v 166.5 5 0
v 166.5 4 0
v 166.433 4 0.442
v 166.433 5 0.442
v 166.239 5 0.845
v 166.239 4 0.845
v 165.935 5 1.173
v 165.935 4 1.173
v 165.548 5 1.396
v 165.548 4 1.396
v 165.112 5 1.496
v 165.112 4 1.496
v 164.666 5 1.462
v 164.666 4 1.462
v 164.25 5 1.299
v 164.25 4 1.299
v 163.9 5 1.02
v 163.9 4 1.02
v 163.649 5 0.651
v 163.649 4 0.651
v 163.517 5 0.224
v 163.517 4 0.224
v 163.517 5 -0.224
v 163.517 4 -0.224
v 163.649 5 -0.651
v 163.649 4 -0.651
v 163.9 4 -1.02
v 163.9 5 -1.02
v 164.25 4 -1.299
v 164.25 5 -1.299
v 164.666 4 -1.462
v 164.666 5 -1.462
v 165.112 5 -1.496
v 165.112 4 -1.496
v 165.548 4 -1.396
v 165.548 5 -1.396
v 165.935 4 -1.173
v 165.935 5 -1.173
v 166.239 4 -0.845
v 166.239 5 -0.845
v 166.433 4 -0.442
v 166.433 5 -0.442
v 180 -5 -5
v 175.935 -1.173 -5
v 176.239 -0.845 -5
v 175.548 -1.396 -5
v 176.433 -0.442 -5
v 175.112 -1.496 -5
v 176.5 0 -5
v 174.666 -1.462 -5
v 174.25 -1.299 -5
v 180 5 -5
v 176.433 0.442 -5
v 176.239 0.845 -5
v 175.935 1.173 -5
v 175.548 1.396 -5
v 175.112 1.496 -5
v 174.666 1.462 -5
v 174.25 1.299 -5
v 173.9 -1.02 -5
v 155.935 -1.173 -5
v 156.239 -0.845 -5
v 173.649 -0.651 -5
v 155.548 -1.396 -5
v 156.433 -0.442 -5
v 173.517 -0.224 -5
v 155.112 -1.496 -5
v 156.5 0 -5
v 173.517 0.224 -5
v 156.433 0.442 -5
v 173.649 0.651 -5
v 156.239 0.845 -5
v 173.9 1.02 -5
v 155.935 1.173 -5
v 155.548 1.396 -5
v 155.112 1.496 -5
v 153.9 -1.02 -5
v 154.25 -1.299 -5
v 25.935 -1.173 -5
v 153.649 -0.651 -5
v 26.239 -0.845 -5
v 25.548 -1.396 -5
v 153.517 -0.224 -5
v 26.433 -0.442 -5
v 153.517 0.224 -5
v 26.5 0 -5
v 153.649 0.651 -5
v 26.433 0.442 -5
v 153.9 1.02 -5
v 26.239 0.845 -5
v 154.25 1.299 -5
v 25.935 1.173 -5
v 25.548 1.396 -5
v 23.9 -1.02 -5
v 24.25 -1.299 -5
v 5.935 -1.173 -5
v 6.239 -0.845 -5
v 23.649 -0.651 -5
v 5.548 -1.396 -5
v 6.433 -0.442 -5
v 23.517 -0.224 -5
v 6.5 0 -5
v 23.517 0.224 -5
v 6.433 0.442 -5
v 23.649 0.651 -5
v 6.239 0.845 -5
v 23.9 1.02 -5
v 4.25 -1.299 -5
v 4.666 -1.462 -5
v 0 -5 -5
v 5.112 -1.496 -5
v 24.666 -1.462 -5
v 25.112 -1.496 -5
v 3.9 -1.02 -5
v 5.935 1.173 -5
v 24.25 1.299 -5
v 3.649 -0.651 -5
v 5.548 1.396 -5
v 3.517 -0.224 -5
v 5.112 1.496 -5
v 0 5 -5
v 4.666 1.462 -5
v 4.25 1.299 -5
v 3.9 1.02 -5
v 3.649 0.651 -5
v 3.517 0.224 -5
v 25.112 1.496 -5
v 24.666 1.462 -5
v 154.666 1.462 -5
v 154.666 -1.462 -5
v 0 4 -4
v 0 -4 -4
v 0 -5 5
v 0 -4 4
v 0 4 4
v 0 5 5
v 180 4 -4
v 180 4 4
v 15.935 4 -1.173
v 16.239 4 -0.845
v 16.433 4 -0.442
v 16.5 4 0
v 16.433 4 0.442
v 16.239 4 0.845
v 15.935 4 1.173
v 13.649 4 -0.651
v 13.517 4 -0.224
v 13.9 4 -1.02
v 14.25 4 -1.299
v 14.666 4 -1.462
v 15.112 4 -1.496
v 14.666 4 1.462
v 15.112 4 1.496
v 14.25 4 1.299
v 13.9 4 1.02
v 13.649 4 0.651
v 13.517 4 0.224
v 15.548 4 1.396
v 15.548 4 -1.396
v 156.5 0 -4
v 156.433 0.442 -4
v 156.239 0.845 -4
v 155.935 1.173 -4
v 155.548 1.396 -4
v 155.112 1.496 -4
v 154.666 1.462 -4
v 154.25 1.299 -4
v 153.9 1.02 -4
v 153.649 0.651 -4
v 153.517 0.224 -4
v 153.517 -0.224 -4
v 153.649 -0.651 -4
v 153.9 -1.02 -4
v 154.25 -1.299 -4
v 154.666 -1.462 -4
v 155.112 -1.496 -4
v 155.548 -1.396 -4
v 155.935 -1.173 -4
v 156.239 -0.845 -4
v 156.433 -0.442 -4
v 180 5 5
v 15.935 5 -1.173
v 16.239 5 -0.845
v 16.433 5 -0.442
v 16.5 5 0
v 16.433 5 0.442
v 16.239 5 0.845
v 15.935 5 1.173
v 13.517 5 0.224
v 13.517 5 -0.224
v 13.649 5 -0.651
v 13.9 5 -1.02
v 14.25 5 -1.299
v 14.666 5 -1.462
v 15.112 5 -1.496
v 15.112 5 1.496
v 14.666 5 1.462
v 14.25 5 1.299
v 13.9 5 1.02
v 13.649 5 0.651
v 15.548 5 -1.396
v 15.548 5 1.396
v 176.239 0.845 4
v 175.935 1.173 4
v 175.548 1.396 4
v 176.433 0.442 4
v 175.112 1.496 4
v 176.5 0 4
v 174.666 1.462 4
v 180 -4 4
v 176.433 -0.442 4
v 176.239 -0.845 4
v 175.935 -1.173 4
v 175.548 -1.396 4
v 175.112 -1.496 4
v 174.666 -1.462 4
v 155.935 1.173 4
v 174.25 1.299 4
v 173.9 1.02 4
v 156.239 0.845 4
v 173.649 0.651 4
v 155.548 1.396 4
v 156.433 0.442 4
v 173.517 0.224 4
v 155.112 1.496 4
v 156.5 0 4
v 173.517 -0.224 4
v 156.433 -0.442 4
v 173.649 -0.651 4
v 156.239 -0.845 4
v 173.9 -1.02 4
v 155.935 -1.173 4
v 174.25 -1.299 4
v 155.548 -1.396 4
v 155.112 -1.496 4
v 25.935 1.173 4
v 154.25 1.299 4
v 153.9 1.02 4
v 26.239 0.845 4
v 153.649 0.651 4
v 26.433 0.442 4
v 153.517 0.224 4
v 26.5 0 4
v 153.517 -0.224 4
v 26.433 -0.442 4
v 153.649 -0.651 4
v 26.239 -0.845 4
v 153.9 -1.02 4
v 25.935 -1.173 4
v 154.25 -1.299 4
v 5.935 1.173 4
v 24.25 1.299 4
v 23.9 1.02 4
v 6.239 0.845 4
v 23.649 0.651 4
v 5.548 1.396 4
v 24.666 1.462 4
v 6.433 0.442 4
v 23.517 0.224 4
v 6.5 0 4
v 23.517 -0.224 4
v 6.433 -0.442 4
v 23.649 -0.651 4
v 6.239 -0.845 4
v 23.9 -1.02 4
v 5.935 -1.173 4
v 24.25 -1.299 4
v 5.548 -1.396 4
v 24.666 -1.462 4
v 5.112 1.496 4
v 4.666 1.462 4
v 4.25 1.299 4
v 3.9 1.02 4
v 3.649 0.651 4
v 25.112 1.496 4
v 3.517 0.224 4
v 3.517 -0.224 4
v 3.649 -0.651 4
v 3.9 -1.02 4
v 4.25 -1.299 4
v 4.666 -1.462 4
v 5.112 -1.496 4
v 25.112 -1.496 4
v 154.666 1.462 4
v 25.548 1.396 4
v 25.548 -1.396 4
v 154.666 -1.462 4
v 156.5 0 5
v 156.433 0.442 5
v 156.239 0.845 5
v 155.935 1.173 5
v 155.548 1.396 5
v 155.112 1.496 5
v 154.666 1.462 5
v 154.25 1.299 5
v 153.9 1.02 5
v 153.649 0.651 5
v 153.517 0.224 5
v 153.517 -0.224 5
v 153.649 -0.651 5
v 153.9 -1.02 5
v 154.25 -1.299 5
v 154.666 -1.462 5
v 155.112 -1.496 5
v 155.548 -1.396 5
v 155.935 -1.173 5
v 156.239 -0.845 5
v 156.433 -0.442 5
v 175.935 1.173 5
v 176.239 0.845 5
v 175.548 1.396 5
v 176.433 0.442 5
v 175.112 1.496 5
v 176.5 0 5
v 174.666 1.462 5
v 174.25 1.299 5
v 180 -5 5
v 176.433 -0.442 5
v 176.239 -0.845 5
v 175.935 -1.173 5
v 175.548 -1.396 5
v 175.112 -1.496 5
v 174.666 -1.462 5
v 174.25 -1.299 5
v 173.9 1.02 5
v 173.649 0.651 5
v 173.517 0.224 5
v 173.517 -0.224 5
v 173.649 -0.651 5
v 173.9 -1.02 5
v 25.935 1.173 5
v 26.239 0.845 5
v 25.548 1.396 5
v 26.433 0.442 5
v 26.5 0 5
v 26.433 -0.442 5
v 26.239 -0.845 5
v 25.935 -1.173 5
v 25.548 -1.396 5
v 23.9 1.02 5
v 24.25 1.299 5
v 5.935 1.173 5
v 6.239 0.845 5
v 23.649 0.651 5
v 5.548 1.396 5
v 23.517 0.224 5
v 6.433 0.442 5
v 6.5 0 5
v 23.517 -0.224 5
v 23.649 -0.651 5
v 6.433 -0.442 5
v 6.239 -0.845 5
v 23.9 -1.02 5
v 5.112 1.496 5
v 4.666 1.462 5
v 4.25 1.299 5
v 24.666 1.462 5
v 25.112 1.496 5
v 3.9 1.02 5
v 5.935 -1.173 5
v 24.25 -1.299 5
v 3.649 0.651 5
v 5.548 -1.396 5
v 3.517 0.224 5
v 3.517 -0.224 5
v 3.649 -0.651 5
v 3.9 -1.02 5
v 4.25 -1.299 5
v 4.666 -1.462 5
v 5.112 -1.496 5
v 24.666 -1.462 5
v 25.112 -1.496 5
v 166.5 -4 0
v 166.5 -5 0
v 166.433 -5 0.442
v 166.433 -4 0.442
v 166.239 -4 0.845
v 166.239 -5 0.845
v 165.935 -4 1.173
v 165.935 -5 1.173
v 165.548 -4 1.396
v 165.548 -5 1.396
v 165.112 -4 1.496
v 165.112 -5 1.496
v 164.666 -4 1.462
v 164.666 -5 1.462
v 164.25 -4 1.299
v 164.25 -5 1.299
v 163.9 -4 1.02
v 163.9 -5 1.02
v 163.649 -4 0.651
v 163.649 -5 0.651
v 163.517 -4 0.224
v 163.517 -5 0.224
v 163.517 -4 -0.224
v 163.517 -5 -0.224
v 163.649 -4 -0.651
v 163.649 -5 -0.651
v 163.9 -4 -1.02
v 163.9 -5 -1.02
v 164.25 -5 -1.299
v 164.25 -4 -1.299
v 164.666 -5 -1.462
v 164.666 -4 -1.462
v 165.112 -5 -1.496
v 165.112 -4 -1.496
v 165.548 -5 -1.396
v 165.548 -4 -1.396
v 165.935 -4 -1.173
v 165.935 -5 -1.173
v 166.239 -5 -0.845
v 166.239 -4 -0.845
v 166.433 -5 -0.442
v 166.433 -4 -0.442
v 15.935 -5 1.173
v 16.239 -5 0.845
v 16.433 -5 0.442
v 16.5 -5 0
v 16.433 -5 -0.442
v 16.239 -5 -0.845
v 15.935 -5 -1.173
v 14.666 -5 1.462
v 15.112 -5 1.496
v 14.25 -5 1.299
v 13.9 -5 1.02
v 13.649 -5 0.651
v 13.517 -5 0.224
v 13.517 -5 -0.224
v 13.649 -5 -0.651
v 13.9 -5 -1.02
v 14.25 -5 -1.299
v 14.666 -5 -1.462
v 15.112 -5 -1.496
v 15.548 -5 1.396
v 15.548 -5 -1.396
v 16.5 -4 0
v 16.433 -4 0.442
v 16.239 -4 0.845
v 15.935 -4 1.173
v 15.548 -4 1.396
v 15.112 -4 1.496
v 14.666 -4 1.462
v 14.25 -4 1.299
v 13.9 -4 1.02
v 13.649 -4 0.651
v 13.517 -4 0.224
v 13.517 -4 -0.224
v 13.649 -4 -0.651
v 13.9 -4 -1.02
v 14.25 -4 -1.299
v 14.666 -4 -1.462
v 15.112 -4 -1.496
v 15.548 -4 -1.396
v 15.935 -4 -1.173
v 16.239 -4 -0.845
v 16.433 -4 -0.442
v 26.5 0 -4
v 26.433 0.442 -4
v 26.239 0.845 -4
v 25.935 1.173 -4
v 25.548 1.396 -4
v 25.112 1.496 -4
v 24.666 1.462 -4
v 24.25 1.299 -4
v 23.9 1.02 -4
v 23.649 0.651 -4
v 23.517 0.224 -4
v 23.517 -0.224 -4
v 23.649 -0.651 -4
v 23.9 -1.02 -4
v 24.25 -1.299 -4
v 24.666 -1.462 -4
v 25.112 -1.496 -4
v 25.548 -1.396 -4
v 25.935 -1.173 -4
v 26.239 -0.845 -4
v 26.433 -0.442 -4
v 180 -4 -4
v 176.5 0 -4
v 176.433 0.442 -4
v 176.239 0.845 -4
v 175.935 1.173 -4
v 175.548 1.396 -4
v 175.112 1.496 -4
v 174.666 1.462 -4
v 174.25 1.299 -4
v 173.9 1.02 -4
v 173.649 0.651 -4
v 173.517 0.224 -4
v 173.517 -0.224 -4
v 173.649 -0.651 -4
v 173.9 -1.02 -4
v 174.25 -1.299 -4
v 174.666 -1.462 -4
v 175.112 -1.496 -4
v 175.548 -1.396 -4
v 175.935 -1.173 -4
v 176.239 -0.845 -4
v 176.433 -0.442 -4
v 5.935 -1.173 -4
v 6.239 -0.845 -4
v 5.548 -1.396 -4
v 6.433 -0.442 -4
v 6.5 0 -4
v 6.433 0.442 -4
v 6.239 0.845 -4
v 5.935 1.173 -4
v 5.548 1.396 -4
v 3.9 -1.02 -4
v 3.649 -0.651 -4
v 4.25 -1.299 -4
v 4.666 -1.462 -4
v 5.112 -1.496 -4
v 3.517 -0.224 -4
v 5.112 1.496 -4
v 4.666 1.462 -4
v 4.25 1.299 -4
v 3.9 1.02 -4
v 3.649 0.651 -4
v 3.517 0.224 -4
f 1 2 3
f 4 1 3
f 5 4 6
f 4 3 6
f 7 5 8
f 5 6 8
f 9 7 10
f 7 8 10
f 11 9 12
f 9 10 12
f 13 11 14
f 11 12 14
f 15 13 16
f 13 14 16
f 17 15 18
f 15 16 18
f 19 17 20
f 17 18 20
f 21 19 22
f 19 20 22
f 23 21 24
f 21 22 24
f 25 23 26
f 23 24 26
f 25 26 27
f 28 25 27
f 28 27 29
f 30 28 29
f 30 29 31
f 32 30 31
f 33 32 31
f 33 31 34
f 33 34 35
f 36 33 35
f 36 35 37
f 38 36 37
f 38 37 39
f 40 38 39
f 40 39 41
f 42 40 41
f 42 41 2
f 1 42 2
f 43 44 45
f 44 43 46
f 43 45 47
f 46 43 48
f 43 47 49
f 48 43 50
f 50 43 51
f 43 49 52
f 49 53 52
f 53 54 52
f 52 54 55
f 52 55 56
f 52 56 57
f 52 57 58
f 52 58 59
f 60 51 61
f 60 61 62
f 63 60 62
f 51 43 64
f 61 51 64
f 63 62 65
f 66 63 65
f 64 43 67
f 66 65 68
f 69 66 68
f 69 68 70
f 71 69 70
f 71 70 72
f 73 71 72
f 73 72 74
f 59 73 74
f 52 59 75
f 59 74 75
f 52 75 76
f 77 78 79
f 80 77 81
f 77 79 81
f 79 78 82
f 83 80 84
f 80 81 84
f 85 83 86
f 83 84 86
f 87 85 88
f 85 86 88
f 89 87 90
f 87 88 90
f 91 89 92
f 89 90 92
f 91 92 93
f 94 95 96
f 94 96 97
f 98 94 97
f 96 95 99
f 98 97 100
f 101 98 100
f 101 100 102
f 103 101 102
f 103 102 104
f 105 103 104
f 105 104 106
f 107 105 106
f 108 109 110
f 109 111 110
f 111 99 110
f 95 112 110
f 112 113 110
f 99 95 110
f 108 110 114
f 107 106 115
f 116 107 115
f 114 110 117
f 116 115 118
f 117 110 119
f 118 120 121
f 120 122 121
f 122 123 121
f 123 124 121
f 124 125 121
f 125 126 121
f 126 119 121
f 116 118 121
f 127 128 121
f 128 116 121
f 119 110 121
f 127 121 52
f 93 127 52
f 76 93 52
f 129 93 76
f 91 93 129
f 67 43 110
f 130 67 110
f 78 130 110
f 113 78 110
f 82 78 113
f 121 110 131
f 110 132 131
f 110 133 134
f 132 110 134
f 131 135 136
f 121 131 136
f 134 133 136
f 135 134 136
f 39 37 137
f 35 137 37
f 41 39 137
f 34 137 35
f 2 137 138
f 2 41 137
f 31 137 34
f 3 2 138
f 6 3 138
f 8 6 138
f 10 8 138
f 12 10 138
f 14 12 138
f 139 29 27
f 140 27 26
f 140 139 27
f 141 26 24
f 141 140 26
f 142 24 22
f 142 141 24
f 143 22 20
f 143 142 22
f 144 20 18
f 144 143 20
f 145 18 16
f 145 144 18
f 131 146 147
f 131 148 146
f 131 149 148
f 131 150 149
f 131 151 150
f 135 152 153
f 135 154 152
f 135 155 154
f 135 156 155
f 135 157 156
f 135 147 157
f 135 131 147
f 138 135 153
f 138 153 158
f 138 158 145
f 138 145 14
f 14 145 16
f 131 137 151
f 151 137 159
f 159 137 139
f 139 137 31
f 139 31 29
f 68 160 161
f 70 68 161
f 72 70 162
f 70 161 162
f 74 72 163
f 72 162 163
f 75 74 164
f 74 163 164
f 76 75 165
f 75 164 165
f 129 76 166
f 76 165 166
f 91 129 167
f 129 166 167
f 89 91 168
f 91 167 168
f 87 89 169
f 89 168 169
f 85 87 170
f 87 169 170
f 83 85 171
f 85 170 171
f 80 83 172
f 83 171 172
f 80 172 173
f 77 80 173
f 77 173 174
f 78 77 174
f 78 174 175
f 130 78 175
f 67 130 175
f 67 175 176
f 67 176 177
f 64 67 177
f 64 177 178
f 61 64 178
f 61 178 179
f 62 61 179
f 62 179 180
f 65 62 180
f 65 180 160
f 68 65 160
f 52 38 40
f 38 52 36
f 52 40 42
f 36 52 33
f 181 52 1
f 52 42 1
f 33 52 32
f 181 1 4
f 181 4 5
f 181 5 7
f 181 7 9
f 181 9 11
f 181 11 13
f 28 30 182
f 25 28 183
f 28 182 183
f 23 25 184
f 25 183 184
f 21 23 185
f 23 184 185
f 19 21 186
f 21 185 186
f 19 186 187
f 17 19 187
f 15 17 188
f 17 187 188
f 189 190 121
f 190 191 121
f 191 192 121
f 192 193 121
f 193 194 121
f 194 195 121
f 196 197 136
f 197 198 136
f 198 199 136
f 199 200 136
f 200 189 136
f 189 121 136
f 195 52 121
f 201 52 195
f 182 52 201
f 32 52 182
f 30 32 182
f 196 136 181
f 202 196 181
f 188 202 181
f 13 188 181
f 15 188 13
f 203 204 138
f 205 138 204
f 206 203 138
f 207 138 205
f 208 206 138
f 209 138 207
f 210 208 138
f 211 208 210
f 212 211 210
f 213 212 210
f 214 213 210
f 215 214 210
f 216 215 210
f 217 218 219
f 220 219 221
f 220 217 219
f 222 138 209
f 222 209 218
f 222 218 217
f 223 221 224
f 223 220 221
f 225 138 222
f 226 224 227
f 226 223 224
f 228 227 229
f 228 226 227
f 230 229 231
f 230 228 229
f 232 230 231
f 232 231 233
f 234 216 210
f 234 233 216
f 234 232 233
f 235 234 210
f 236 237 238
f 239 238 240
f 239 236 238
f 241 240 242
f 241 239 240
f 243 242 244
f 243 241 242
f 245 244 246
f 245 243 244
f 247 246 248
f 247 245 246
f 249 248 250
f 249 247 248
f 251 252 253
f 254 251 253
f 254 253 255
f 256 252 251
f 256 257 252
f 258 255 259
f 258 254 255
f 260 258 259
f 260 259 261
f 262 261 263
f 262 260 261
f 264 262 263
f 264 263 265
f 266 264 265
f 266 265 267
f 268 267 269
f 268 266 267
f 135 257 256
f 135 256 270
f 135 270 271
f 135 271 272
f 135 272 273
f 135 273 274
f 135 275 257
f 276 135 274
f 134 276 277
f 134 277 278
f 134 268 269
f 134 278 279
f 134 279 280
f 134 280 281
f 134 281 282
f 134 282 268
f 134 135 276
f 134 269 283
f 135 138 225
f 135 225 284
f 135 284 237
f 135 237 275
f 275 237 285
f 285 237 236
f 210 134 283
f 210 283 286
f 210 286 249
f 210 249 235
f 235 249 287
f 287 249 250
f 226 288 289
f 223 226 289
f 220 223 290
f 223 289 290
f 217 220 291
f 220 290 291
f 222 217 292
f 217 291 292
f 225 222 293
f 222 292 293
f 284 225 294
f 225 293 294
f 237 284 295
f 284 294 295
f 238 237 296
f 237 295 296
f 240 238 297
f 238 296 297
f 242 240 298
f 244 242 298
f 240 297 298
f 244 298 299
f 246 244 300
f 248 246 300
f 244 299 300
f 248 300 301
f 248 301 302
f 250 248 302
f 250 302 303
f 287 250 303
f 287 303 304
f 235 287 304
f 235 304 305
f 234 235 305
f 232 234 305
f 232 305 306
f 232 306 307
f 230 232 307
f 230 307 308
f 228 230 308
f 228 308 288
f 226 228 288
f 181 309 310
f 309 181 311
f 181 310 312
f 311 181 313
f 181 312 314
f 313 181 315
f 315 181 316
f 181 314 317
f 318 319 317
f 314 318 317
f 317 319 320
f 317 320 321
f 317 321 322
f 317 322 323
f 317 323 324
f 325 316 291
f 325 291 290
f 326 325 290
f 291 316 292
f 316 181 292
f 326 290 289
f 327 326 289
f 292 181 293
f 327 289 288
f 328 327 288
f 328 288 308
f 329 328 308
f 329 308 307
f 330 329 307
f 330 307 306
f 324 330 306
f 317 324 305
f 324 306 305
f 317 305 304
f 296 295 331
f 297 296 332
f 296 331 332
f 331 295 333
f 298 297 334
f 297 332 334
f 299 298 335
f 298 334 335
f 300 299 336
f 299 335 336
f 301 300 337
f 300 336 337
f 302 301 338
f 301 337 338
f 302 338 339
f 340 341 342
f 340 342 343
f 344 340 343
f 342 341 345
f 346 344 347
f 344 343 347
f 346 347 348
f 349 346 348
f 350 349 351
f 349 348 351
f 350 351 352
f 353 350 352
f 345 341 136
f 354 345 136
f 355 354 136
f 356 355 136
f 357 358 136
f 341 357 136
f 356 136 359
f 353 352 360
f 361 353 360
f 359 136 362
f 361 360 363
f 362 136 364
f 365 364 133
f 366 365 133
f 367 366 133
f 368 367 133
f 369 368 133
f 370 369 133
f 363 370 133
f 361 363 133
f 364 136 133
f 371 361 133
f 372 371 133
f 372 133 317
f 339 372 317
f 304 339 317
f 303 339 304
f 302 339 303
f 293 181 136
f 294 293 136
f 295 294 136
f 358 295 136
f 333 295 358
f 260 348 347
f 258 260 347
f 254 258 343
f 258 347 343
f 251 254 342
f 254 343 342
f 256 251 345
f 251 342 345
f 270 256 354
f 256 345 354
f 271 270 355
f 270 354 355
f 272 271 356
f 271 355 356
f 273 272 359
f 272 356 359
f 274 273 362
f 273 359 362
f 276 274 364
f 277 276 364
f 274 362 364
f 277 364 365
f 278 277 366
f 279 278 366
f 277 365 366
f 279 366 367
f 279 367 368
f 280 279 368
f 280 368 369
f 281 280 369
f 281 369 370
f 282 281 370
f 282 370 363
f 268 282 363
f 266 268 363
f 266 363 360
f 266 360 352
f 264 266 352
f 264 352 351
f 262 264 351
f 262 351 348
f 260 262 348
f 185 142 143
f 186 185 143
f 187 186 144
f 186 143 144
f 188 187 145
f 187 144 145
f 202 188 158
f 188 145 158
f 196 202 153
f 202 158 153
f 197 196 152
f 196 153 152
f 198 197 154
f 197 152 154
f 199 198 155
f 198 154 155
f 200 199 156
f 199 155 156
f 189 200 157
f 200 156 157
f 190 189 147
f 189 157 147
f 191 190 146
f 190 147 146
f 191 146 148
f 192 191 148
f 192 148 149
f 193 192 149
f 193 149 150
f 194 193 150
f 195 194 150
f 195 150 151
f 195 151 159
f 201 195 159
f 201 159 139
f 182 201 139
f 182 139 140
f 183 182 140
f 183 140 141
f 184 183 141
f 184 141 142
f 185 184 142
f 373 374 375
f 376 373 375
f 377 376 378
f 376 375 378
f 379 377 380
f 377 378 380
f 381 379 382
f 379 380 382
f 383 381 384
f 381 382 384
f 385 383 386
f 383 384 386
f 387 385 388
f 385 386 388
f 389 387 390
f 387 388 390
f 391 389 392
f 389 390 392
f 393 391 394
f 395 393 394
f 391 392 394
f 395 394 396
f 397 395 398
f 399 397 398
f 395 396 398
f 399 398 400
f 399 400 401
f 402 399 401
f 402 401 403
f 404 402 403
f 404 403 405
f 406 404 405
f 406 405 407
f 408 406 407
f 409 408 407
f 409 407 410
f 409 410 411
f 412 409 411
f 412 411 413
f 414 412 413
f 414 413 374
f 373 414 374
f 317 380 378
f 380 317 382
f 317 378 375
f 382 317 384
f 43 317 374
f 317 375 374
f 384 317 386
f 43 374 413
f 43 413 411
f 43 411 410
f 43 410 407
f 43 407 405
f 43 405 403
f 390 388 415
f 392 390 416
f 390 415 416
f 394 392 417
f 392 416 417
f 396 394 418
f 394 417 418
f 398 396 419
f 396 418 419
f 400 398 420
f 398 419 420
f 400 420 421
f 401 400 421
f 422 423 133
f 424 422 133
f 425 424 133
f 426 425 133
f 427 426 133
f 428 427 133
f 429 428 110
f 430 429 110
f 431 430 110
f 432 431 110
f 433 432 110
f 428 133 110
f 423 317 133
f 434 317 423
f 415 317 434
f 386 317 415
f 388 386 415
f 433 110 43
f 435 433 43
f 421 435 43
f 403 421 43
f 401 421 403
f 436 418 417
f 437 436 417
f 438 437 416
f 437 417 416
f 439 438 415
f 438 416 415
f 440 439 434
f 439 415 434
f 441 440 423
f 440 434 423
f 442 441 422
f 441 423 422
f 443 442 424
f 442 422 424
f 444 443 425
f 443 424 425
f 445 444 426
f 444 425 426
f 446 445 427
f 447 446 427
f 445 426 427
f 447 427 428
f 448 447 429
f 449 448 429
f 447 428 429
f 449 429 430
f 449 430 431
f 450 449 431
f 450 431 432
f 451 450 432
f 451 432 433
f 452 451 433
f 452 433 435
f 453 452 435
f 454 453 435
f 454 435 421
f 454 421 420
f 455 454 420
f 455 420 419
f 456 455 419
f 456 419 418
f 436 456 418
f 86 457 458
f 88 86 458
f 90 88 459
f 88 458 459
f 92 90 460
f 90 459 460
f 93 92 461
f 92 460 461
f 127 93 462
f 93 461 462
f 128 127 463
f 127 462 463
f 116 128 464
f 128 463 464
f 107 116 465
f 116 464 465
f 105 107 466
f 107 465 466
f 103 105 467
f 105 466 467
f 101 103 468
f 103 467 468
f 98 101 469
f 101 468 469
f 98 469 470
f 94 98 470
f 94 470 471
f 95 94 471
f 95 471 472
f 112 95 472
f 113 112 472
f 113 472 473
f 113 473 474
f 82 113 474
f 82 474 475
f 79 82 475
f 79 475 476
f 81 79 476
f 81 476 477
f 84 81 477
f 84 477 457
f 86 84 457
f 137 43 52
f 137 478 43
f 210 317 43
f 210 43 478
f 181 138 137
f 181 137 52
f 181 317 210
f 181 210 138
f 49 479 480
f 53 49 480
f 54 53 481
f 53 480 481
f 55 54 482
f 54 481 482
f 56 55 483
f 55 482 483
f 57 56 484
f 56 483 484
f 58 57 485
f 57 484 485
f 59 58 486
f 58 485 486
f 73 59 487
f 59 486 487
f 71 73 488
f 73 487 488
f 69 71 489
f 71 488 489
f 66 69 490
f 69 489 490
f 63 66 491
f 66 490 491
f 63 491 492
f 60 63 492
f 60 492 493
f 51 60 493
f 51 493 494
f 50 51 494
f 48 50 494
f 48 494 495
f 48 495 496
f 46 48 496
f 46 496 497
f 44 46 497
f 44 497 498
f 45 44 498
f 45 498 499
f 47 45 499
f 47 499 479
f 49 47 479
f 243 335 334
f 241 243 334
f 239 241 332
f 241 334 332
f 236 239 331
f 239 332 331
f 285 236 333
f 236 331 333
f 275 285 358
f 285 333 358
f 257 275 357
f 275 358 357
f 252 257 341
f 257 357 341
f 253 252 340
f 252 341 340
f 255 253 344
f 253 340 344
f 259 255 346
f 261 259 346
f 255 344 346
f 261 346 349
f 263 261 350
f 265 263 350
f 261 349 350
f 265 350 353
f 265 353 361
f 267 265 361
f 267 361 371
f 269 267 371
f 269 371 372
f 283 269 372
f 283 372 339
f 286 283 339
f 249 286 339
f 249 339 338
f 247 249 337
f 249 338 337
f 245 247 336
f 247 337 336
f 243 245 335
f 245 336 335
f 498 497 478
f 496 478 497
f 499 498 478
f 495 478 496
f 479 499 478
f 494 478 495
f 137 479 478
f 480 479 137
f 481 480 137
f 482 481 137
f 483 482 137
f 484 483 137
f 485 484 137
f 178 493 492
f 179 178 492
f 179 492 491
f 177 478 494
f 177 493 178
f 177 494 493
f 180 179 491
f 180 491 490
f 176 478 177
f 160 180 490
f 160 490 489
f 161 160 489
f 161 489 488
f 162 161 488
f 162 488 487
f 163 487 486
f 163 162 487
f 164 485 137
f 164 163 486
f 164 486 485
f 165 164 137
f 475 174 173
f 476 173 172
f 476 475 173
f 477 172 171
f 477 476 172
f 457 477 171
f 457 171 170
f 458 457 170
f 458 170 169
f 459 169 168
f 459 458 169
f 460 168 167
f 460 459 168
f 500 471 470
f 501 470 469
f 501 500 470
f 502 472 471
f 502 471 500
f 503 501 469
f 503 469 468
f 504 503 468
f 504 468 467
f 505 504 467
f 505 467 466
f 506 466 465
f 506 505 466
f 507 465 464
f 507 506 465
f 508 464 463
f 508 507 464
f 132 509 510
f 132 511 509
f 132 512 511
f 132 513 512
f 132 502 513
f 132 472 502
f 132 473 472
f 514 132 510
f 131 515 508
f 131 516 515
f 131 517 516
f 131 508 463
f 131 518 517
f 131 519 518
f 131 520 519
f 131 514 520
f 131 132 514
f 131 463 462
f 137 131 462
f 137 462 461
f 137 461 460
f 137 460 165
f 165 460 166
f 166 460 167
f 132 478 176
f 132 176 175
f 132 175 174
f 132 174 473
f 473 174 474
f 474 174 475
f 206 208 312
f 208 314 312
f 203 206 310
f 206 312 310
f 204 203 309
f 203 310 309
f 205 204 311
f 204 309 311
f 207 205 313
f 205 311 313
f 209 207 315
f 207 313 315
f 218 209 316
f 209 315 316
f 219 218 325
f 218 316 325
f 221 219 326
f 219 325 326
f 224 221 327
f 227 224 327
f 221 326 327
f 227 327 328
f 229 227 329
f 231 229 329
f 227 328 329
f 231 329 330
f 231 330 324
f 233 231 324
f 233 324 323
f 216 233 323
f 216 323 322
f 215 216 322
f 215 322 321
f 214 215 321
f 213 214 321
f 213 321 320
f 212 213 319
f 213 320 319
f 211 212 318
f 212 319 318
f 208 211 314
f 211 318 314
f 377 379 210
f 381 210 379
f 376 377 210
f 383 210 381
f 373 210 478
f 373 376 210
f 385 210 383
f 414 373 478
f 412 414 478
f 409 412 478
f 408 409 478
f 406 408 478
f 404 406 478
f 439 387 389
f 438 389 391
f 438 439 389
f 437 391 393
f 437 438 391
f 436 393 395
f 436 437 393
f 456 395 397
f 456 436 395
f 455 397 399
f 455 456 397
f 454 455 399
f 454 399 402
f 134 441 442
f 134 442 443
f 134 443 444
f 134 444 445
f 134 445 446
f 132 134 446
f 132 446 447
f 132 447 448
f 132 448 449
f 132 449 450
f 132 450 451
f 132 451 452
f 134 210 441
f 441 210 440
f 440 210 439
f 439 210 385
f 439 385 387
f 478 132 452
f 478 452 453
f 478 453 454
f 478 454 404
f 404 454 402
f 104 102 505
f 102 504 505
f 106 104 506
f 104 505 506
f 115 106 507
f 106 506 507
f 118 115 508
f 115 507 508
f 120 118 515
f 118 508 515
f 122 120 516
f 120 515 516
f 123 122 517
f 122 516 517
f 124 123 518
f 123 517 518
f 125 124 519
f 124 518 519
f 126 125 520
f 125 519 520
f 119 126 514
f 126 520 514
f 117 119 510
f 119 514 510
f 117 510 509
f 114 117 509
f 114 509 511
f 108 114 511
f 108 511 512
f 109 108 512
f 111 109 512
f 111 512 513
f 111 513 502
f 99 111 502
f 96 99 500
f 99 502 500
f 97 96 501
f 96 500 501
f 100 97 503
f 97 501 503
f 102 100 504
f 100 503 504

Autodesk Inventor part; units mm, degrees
ref_plane "YZ Plane" through (0, 0, 0) normal (1, 0, 0) x (0, 1, 0)
ref_plane "XZ Plane" through (0, 0, 0) normal (0, 1, 0) x (-1, 0, 0)
ref_plane "XY Plane" through (0, 0, 0) normal (0, 0, 1) x (1, 0, 0)
sketch "スケッチ1" plane through (0, 0, 0) normal (1, 0, 0) x (0, 1, 0)
  line L0 (5, 5) -> (-5, 5)
  line L1 (-5, 5) -> (-5, -5)
  line L2 (-5, -5) -> (5, -5)
  line L3 (5, -5) -> (5, 5)
  line L4 (4, 4) -> (-4, 4)
  line L5 (-4, 4) -> (-4, -4)
  line L6 (-4, -4) -> (4, -4)
  line L7 (4, -4) -> (4, 4)
  point P0 (0, 0)
  dimension "d0" = 1
  dimension "d1" = 1
  dimension "d2" = 1
  dimension "d3" = 1
  dimension "d4" = 10
  dimension "d5" = 10
  dimension "d6" = 5
  dimension "d7" = 5
extrude "押し出し1" add sketch "スケッチ1" along normal blind 180
sketch "スケッチ2" plane through (0, -5, 5) normal (0, 0, 1) x (1, 0, 0)
  circle A0 centre (5, 5) radius 1.5
  circle A1 centre (175, 5) radius 1.5
  line L0 (180, 10) -> (180, 0) projected
  line L1 (0, 0) -> (180, 0) projected
  line L2 (0, 10) -> (0, 0) projected
  line L3 (0, 10) -> (180, 10) projected
  point P0 (0, 5)
  dimension "d10" = 5
  dimension "d11" = 3
  dimension "d12" = 5
  dimension "d13" = 3
  dimension "d14" = 5
  dimension "d15" = 5
extrude "押し出し2" cut sketch "スケッチ2" against normal blind 200 contours A0 | A1
sketch "スケッチ3" plane through (0, -5, -5) normal (0, -1, 0) x (1, 0, 0)
  circle A0 centre (15, 5) radius 1.5
  line L0 (0, 10) -> (0, 0) projected
  line L1 (0, 0) -> (180, 0) projected
  circle A1 centre (165, 5) radius 1.5
  line L2 (180, 10) -> (180, 0) projected
  line L3 (0, 10) -> (180, 10) projected
  point P0 (0, 5)
  dimension "d18" = 15
  dimension "d19" = 3
  dimension "d20" = 5
  dimension "d21" = 3
  dimension "d22" = 15
  dimension "d23" = 5
extrude "押し出し3" cut sketch "スケッチ3" against normal blind 200 contours A0 | A1
sketch "スケッチ4" plane through (0, -5, 5) normal (0, 0, 1) x (1, 0, 0)
  circle A0 centre (25, 5) radius 1.5
  circle A1 centre (155, 5) radius 1.5
  line L0 (0, 10) -> (0, 0) projected
  line L1 (0, 0) -> (180, 0) projected
  line L2 (180, 10) -> (180, 0) projected
  point P0 (0, 5)
  dimension "d26" = 25
  dimension "d27" = 3
  dimension "d28" = 5
  dimension "d29" = 5
  dimension "d30" = 25
  dimension "d31" = 3
extrude "押し出し4" cut sketch "スケッチ4" against normal blind 200
properties part number "モーターパーツ３" material "アルミニウム 6061"
